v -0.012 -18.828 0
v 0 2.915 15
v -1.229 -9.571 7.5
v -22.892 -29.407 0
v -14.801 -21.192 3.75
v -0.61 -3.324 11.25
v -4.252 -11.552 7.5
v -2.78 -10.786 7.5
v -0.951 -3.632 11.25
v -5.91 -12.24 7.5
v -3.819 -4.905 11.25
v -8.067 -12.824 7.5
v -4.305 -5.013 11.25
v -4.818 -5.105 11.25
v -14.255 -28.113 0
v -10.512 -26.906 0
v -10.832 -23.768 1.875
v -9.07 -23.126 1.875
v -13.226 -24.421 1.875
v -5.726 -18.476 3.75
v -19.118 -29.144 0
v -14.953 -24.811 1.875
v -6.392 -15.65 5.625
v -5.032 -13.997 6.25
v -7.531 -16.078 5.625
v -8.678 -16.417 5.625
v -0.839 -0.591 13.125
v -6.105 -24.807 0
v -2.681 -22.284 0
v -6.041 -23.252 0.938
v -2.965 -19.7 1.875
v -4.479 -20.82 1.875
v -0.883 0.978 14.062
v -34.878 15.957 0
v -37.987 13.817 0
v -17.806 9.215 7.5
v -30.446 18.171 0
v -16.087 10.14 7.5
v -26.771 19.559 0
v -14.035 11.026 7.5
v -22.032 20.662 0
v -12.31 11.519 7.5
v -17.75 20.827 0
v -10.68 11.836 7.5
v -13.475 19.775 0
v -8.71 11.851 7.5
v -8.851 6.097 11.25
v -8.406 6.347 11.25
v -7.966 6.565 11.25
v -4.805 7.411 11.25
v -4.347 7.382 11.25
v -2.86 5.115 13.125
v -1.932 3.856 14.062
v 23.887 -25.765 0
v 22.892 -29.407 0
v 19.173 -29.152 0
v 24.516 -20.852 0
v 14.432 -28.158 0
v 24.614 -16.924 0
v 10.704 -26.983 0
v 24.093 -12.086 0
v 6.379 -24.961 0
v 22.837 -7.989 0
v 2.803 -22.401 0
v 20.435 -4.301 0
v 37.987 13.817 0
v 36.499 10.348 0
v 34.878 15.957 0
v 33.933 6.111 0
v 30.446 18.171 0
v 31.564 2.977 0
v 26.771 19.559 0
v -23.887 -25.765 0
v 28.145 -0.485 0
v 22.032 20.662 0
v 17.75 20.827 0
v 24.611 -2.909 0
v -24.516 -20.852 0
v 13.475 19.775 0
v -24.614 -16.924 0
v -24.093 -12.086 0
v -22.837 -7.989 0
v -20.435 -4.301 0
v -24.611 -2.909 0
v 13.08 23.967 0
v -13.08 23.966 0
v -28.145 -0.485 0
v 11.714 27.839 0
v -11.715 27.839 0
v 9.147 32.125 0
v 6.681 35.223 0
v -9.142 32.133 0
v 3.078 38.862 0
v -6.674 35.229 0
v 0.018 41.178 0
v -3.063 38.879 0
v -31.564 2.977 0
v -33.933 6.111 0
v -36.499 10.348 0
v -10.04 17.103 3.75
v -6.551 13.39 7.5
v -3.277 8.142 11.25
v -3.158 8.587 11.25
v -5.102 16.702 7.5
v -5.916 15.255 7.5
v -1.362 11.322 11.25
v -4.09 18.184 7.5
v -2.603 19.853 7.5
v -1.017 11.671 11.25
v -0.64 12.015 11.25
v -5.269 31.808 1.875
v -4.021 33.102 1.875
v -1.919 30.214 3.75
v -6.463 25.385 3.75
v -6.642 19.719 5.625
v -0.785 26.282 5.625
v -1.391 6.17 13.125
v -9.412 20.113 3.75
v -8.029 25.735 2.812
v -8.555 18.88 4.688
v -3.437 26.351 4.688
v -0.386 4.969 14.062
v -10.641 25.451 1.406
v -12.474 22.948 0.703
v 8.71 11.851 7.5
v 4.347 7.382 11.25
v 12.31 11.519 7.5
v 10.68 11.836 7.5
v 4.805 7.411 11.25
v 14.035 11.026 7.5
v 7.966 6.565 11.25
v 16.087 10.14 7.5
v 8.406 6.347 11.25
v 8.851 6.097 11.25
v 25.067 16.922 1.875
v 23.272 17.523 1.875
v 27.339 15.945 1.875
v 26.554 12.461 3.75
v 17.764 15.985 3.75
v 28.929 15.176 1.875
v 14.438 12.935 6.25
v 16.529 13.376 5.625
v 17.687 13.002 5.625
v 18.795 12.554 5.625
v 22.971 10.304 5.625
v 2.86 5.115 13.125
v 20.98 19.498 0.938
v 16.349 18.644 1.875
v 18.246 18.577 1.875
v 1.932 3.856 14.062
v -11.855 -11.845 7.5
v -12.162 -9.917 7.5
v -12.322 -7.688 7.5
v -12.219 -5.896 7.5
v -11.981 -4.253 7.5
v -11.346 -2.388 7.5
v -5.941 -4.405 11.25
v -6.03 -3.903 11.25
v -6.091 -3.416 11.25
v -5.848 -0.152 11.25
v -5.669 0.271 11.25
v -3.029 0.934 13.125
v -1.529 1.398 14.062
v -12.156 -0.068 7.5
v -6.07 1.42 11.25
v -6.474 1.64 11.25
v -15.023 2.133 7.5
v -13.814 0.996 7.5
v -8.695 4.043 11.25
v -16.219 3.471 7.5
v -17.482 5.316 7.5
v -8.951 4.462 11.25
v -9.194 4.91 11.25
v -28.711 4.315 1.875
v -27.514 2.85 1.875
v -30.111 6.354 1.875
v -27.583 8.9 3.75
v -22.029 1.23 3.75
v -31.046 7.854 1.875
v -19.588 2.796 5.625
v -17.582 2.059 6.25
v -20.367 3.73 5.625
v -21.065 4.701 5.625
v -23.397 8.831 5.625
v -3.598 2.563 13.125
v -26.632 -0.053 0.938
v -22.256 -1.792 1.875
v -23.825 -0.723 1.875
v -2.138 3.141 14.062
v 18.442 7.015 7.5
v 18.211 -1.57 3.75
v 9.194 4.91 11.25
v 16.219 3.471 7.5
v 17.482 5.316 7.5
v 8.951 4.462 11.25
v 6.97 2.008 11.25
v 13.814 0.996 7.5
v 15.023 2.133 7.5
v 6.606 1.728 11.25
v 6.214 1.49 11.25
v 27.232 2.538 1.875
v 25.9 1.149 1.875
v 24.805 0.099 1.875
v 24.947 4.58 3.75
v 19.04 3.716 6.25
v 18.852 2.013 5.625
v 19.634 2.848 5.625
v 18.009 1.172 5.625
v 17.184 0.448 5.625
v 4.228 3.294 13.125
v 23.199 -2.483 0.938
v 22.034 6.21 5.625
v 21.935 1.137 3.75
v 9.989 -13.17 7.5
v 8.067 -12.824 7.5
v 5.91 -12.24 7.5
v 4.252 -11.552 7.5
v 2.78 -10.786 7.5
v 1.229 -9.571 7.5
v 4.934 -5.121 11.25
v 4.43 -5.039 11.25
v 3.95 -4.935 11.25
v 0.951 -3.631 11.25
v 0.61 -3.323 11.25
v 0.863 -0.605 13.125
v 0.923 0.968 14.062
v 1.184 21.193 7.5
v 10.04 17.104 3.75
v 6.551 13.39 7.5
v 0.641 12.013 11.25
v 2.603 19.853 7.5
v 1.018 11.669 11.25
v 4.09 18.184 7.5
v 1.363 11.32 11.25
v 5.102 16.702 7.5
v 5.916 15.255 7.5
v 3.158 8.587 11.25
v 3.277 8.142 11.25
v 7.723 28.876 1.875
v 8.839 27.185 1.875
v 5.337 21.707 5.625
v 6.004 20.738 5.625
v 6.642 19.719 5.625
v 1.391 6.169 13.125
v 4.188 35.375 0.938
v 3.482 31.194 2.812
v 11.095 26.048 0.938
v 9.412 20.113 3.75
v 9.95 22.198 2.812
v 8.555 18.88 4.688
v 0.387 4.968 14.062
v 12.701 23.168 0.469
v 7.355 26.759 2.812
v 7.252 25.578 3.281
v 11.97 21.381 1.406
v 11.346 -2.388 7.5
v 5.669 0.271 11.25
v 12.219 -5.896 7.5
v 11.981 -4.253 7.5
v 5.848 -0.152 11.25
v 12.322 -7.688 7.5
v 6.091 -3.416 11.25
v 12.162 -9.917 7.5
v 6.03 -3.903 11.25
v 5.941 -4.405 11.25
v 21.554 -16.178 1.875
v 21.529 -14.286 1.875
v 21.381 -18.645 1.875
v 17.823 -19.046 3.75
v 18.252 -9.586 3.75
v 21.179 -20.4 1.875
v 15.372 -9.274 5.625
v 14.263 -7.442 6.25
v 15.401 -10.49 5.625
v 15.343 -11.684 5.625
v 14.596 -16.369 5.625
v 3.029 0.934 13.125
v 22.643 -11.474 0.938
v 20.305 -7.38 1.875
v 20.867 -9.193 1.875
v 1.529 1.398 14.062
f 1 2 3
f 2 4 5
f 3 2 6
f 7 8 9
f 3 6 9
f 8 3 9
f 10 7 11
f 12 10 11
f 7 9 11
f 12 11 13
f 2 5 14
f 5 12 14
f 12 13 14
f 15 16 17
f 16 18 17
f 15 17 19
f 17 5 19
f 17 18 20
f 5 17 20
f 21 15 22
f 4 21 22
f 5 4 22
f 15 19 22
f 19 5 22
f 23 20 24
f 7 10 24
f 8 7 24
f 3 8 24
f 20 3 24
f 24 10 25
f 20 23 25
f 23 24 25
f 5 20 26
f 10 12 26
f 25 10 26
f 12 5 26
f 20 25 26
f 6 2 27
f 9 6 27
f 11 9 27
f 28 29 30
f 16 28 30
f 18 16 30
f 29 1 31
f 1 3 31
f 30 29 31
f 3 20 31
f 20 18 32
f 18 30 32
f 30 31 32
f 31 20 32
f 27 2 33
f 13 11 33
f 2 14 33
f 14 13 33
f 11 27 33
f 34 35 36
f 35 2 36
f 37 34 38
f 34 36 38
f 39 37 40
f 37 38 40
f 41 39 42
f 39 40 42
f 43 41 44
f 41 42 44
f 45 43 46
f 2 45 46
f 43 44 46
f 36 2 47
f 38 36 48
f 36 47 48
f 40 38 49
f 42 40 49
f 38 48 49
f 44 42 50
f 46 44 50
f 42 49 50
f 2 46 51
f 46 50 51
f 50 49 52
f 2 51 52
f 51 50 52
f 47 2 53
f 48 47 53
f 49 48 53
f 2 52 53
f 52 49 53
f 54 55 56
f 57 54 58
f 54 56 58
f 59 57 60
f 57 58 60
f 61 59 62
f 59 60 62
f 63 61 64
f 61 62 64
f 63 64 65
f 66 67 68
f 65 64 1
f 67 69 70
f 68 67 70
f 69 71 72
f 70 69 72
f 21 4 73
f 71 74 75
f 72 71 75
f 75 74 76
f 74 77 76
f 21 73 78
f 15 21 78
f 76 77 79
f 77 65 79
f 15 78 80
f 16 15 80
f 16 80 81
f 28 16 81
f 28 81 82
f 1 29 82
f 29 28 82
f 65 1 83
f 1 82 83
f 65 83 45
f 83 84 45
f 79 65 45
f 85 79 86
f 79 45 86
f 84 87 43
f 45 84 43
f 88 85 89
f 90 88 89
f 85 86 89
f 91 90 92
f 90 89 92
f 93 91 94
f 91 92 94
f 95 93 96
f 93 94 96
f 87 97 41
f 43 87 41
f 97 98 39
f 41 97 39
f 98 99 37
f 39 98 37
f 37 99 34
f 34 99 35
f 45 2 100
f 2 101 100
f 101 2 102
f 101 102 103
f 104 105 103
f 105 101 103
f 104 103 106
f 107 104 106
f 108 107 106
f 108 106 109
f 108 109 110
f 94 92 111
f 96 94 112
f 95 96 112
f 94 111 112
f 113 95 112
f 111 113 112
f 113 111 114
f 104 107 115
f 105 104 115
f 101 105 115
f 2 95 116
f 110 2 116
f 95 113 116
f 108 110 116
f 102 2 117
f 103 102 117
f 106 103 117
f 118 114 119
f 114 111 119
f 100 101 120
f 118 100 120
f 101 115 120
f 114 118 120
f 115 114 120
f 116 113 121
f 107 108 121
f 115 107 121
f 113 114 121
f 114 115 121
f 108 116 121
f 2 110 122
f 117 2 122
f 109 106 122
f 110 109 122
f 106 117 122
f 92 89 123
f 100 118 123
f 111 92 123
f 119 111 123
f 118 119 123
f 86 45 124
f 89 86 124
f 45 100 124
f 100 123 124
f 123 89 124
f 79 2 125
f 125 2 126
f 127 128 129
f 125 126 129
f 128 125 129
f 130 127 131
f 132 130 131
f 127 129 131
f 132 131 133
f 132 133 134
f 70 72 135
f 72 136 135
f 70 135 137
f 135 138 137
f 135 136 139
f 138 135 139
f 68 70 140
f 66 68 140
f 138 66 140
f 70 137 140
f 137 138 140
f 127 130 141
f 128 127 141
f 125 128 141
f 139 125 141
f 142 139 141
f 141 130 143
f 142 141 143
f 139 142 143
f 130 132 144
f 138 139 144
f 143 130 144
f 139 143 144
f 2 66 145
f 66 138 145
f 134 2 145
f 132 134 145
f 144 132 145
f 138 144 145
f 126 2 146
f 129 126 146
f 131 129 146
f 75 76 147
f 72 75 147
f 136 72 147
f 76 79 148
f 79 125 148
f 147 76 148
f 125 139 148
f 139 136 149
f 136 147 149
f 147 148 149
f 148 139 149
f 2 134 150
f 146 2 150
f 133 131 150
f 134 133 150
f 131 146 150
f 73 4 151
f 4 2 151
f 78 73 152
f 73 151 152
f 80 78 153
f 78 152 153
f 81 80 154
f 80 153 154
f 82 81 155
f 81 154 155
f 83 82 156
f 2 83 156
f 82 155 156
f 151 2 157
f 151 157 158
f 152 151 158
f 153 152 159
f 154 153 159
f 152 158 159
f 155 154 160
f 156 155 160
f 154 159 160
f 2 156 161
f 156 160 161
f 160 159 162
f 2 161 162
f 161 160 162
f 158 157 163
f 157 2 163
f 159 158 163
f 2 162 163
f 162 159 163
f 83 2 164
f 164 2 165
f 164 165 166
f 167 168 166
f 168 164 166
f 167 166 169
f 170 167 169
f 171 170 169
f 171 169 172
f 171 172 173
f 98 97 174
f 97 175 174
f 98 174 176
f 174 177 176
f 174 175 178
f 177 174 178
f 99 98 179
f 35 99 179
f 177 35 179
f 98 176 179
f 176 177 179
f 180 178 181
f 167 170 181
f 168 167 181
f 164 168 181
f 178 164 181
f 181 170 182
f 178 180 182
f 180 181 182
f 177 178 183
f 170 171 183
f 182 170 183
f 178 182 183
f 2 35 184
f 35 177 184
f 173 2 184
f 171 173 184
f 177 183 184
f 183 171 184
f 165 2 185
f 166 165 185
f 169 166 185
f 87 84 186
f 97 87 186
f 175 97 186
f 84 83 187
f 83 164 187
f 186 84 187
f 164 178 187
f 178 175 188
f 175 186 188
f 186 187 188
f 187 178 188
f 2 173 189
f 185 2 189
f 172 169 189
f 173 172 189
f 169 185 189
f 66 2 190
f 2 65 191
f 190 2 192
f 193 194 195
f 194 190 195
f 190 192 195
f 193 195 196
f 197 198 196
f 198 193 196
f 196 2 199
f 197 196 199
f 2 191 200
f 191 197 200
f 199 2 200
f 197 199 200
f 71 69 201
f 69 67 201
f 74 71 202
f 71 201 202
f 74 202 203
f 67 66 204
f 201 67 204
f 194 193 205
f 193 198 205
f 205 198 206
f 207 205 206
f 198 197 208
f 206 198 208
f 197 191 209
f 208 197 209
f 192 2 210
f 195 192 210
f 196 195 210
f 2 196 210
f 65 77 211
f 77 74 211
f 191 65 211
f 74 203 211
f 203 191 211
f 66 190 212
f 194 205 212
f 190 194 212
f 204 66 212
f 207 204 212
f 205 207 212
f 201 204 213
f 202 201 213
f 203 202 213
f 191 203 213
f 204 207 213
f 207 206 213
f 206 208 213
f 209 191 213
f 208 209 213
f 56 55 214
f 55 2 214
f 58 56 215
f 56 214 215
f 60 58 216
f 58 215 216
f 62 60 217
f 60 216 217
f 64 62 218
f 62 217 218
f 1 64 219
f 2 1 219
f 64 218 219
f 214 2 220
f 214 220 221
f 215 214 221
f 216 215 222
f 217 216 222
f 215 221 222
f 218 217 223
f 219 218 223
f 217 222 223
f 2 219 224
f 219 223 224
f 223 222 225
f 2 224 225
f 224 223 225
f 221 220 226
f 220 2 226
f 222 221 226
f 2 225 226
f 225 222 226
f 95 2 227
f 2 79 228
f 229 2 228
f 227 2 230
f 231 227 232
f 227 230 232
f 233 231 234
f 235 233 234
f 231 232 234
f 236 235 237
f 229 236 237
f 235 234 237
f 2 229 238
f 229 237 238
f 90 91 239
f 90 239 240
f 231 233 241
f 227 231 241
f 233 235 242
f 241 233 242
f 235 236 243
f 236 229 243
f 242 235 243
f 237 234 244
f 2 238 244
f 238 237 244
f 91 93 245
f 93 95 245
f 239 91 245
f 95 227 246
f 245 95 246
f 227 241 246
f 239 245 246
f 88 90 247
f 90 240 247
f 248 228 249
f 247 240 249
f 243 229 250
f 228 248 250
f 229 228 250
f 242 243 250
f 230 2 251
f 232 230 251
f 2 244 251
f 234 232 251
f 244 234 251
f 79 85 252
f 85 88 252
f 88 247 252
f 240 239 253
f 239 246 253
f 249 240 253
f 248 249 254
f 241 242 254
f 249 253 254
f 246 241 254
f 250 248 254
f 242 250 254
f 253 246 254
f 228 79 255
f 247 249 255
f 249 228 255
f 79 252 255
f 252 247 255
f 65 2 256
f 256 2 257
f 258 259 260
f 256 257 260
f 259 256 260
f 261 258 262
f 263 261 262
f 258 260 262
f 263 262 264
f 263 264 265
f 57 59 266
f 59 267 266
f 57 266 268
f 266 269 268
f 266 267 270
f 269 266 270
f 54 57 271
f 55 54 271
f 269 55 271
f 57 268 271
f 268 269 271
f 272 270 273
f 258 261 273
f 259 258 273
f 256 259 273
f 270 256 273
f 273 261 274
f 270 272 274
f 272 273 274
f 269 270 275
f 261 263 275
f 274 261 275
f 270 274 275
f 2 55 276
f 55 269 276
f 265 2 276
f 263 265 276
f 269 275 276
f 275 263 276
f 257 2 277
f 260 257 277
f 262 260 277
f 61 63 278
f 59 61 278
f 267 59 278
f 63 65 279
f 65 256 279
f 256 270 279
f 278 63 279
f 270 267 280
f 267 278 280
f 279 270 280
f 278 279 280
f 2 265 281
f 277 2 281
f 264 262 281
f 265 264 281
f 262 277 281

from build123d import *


with BuildPart() as f3:
    # F0 (on Top) → F3 section 0
    with BuildSketch(Plane.XY, mode=Mode.PRIVATE) as f3_s0:
        with BuildLine():
            add(Edge.make_bspline(
                [(-0.0124753234, -18.8278970229), (-0.7697904308, -19.961200205), (-2.2671056849, -22.197438687), (-5.4971396824, -24.5782476493), (-8.5097982693, -26.0415576227), (-11.8078546142, -27.5175122814), (-16.1019245528, -28.5916930097), (-19.9103525288, -29.3506524555), (-21.9520953162, -29.382071457), (-22.8920214886, -29.4066522003)],
                knots=[0.0008153077, 0.0008153077, 0.0008153077, 0.0008153077, 0.1493003301, 0.2961209658, 0.430920111, 0.5710544916, 0.7274599749, 0.8736269908, 1, 1, 1, 1], degree=3))
            add(Edge.make_bspline(
                [(-0.0124753234, -18.8278970229), (0.7461960263, -19.9629409698), (2.2745986674, -22.1932064946), (5.4948274268, -24.5789033838), (8.5104220837, -26.0413814507), (11.8076523761, -27.51756638), (16.1020181674, -28.5916798607), (19.9101998248, -29.3506521627), (21.9523565252, -29.3820782881), (22.8920214886, -29.4066522003)],
                knots=[0.0008182641, 0.0008182641, 0.0008182641, 0.0008182641, 0.1495367427, 0.2963165764, 0.4310782604, 0.5711736972, 0.7275357148, 0.8736621104, 1, 1, 1, 1], degree=3))
            add(Edge.make_bspline(
                [(20.4348945499, -4.3006254881), (21.2597065341, -5.3953141435), (22.8839168621, -7.5508167818), (24.0688660994, -11.3924788825), (24.4570494165, -14.7191441124), (24.7630720257, -18.3194174314), (24.3613918358, -22.7275410571), (23.8222374996, -26.5732471939), (23.1787177672, -28.5111798856), (22.8920214886, -29.4066522003)],
                knots=[0, 0, 0, 0, 0.1493003301, 0.2961209658, 0.430920111, 0.5710544916, 0.7274599749, 0.8736269908, 1, 1, 1, 1], degree=3))
            add(Edge.make_bspline(
                [(20.4348945499, -4.3006254881), (21.7618725093, -3.9574235697), (24.374851601, -3.2817083338), (27.6937837356, -1.0129725898), (30.0685709731, 1.3487584314), (32.5493941697, 3.9757593975), (34.9793047253, 7.6755479815), (36.9514996607, 11.0207819383), (37.6543436494, 12.9379963475), (37.9874524251, 13.8172596563)],
                knots=[0, 0, 0, 0, 0.1493003301, 0.2961209658, 0.430920111, 0.5710544916, 0.7274599749, 0.8736269908, 1, 1, 1, 1], degree=3))
            add(Edge.make_bspline(
                [(13.4751550677, 19.7752230943), (14.7805797181, 20.1929844422), (17.3510694176, 21.0156833652), (21.368604162, 20.8677409141), (24.6372381531, 20.1373850615), (28.1370915811, 19.2392515574), (32.1662860229, 17.4066323866), (35.6191854559, 15.6296606384), (37.2365791887, 14.3831702546), (37.9874524251, 13.8172596563)],
                knots=[0, 0, 0, 0, 0.1493003301, 0.2961209658, 0.430920111, 0.5710544916, 0.7274599749, 0.8736269908, 1, 1, 1, 1], degree=3))
            add(Edge.make_bspline(
                [(13.4751550677, 19.7752230943), (13.460514309, 21.1503468021), (13.2999889318, 23.8702205813), (11.9443750321, 27.6361817734), (10.2089491359, 30.5099546927), (8.2582355477, 33.5485532527), (5.2475993623, 36.7955008004), (2.4839183133, 39.5086562648), (0.7863888883, 40.6477204187), (0.0182331866, 41.1781780645)],
                knots=[0, 0, 0, 0, 0.1497970569, 0.2965038342, 0.4311984436, 0.571224151, 0.7275083428, 0.8735620072, 0.999007298, 0.999007298, 0.999007298, 0.999007298], degree=3))
            add(Edge.make_bspline(
                [(-13.4751550677, 19.7752230943), (-13.4605236567, 21.1494688303), (-13.2999630263, 23.870613964), (-11.9444475544, 27.636107175), (-10.2087031525, 30.5099055848), (-8.259242905, 33.5488528158), (-5.2434748417, 36.7942435322), (-2.4932213287, 39.5167791201), (-0.7536039327, 40.6454634899), (0.0182331866, 41.1781780645)],
                knots=[0, 0, 0, 0, 0.1497014163, 0.2963145262, 0.4309231374, 0.5708594429, 0.7270438524, 0.8730042663, 0.9990043912, 0.9990043912, 0.9990043912, 0.9990043912], degree=3))
            add(Edge.make_bspline(
                [(-13.4751550677, 19.7752230943), (-14.7805797181, 20.1929844422), (-17.3510694176, 21.0156833652), (-21.368604162, 20.8677409141), (-24.6372381531, 20.1373850615), (-28.1370915811, 19.2392515574), (-32.1662860229, 17.4066323866), (-35.6191854559, 15.6296606384), (-37.2365791887, 14.3831702546), (-37.9874524251, 13.8172596563)],
                knots=[0, 0, 0, 0, 0.1493003301, 0.2961209658, 0.430920111, 0.5710544916, 0.7274599749, 0.8736269908, 1, 1, 1, 1], degree=3))
            add(Edge.make_bspline(
                [(-20.4348945499, -4.3006254881), (-21.7618725093, -3.9574235697), (-24.374851601, -3.2817083338), (-27.6937837356, -1.0129725898), (-30.0685709731, 1.3487584314), (-32.5493941697, 3.9757593975), (-34.9793047253, 7.6755479815), (-36.9514996607, 11.0207819383), (-37.6543436494, 12.9379963475), (-37.9874524251, 13.8172596563)],
                knots=[0, 0, 0, 0, 0.1493003301, 0.2961209658, 0.430920111, 0.5710544916, 0.7274599749, 0.8736269908, 1, 1, 1, 1], degree=3))
            add(Edge.make_bspline(
                [(-20.4348945499, -4.3006254881), (-21.2597065341, -5.3953141435), (-22.8839168621, -7.5508167818), (-24.0688660994, -11.3924788825), (-24.4570494165, -14.7191441124), (-24.7630720257, -18.3194174314), (-24.3613918358, -22.7275410571), (-23.8222374996, -26.5732471939), (-23.1787177672, -28.5111798856), (-22.8920214886, -29.4066522003)],
                knots=[0, 0, 0, 0, 0.1493003301, 0.2961209658, 0.430920111, 0.5710544916, 0.7274599749, 0.8736269908, 1, 1, 1, 1], degree=3))
        make_face()
    loft([f3_s0.sketch, Vertex(0, 2.9152445495, 15)])


solid = f3.part
